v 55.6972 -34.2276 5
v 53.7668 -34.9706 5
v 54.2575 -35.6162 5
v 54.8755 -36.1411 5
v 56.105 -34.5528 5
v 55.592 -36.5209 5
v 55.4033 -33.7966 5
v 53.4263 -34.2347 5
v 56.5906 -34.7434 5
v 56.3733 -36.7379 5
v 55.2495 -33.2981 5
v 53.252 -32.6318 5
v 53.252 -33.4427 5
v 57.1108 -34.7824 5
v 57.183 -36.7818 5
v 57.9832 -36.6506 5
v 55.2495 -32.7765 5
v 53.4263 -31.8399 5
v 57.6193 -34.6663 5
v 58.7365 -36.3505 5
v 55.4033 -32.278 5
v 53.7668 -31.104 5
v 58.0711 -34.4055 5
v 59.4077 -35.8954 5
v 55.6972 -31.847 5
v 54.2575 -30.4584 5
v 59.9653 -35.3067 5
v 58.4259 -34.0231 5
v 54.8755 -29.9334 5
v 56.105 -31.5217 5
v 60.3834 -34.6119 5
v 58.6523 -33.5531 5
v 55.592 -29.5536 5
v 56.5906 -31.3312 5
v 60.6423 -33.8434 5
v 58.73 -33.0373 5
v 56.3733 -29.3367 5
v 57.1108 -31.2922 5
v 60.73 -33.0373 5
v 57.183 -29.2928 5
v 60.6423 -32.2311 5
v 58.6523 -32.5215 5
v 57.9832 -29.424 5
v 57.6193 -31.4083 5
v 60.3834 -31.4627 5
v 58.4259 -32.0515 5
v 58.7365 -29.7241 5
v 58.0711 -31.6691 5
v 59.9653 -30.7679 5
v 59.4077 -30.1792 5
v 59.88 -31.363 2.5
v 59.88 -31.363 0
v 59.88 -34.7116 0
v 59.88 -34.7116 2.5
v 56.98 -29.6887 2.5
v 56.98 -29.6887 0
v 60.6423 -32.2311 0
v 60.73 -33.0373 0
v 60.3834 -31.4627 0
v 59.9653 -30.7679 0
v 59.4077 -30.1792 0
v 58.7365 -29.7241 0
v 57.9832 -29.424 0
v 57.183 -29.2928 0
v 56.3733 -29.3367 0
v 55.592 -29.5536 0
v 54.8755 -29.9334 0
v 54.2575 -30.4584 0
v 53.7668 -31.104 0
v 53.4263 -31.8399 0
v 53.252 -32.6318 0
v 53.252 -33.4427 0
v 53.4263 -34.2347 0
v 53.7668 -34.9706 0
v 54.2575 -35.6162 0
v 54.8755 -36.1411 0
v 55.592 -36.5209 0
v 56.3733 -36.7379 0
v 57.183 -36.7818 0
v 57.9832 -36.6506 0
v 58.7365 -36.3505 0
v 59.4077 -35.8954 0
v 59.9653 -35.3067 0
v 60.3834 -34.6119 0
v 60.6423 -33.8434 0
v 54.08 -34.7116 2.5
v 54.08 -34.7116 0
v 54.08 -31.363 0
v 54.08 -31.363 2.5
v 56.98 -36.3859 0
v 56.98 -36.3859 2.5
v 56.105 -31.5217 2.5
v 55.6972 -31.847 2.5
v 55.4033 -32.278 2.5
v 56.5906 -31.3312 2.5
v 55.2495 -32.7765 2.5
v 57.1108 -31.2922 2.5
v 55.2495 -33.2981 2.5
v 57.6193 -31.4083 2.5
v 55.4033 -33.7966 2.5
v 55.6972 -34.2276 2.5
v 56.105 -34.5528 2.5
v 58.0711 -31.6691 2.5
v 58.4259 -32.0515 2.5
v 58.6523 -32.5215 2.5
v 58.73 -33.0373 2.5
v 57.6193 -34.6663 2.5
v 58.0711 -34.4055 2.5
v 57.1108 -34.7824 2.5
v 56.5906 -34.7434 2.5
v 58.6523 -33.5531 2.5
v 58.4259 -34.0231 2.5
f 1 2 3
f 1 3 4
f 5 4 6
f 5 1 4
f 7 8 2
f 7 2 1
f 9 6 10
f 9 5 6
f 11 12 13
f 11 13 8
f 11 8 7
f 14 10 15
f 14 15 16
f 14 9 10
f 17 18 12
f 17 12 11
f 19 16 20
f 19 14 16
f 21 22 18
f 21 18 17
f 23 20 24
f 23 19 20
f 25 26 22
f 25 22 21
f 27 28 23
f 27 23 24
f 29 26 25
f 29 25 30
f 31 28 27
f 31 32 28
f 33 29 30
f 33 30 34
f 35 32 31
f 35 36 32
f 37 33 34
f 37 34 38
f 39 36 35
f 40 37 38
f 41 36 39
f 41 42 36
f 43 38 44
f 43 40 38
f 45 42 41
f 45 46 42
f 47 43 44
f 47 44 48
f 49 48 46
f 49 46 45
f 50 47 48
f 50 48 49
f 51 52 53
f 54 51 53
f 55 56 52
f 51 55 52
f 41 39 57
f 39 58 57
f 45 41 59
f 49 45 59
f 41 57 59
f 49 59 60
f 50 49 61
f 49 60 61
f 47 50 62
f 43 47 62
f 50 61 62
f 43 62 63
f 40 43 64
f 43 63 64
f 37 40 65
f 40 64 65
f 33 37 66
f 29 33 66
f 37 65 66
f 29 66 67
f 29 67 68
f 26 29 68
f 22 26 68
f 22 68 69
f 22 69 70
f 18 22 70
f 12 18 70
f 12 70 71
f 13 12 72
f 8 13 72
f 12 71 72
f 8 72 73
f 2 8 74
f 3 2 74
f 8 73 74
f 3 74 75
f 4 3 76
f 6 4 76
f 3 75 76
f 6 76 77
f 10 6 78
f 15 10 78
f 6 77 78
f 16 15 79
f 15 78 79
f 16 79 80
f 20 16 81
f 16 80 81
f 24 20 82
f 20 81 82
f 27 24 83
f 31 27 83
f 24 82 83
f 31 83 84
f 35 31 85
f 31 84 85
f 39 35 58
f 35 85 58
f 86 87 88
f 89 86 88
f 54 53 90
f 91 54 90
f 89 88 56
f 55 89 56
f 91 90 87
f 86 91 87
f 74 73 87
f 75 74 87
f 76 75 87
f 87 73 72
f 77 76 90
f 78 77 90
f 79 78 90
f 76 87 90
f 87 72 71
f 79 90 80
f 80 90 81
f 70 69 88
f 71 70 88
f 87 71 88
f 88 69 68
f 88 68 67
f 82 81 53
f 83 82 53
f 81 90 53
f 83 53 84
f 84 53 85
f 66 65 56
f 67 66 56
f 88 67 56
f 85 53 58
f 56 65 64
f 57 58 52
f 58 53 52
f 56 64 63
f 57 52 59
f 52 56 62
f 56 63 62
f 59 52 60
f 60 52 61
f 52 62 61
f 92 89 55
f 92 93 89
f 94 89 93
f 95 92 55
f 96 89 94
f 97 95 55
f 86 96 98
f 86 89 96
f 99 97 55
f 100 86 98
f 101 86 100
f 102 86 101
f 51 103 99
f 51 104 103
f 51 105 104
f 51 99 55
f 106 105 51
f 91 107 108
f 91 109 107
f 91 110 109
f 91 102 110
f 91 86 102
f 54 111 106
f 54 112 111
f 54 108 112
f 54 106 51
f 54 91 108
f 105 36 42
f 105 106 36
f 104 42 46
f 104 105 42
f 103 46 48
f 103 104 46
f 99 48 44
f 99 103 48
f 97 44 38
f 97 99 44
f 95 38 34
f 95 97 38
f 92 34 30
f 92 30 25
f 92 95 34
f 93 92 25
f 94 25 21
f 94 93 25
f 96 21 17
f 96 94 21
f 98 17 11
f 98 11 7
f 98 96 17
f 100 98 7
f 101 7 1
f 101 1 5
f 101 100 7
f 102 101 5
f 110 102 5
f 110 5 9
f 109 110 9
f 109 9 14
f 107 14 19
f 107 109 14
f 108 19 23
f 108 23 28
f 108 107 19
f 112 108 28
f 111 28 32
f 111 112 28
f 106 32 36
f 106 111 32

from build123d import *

# Parameters (mm, degrees)
F0_R     = 3.75
F0_R_2   = 1.75
F1_DEPTH = 3.8
F3_DEPTH = 2.5
F4_DEPTH = 1.2


with BuildPart() as f1:
    # F0 (on Top) → F1 (new body)
    with BuildSketch(Plane.XY):
        with Locations((56.9799989462, -33.0372825265)):
            Circle(F0_R)
        with Locations((56.9799989462, -33.0372825265)):
            Circle(F0_R_2, mode=Mode.SUBTRACT)
    extrude(amount=F1_DEPTH)

    # F2 (on face) → F3 (cut)
    with BuildSketch(Plane(origin=(0, 0, 0), x_dir=(1, 0, 0), z_dir=(0, 0, -1))):
        Polygon((59.8799989462, 31.3629667458), (59.8799989462, 34.7115983071), (56.9799989462, 36.3859140878), (54.0799989462, 34.7115983071), (54.0799989462, 31.3629667458), (56.9799989462, 29.6886509652), align=None)
    extrude(amount=-F3_DEPTH, mode=Mode.SUBTRACT)

    # F4 (add): a face of the model
    f4_faces = [f1.faces().sort_by_distance(p)[0] for p in [
        (53.3360649634, -33.0372825265, 3.8),
    ]]
    extrude(f4_faces, amount=F4_DEPTH)


solid = f1.part
